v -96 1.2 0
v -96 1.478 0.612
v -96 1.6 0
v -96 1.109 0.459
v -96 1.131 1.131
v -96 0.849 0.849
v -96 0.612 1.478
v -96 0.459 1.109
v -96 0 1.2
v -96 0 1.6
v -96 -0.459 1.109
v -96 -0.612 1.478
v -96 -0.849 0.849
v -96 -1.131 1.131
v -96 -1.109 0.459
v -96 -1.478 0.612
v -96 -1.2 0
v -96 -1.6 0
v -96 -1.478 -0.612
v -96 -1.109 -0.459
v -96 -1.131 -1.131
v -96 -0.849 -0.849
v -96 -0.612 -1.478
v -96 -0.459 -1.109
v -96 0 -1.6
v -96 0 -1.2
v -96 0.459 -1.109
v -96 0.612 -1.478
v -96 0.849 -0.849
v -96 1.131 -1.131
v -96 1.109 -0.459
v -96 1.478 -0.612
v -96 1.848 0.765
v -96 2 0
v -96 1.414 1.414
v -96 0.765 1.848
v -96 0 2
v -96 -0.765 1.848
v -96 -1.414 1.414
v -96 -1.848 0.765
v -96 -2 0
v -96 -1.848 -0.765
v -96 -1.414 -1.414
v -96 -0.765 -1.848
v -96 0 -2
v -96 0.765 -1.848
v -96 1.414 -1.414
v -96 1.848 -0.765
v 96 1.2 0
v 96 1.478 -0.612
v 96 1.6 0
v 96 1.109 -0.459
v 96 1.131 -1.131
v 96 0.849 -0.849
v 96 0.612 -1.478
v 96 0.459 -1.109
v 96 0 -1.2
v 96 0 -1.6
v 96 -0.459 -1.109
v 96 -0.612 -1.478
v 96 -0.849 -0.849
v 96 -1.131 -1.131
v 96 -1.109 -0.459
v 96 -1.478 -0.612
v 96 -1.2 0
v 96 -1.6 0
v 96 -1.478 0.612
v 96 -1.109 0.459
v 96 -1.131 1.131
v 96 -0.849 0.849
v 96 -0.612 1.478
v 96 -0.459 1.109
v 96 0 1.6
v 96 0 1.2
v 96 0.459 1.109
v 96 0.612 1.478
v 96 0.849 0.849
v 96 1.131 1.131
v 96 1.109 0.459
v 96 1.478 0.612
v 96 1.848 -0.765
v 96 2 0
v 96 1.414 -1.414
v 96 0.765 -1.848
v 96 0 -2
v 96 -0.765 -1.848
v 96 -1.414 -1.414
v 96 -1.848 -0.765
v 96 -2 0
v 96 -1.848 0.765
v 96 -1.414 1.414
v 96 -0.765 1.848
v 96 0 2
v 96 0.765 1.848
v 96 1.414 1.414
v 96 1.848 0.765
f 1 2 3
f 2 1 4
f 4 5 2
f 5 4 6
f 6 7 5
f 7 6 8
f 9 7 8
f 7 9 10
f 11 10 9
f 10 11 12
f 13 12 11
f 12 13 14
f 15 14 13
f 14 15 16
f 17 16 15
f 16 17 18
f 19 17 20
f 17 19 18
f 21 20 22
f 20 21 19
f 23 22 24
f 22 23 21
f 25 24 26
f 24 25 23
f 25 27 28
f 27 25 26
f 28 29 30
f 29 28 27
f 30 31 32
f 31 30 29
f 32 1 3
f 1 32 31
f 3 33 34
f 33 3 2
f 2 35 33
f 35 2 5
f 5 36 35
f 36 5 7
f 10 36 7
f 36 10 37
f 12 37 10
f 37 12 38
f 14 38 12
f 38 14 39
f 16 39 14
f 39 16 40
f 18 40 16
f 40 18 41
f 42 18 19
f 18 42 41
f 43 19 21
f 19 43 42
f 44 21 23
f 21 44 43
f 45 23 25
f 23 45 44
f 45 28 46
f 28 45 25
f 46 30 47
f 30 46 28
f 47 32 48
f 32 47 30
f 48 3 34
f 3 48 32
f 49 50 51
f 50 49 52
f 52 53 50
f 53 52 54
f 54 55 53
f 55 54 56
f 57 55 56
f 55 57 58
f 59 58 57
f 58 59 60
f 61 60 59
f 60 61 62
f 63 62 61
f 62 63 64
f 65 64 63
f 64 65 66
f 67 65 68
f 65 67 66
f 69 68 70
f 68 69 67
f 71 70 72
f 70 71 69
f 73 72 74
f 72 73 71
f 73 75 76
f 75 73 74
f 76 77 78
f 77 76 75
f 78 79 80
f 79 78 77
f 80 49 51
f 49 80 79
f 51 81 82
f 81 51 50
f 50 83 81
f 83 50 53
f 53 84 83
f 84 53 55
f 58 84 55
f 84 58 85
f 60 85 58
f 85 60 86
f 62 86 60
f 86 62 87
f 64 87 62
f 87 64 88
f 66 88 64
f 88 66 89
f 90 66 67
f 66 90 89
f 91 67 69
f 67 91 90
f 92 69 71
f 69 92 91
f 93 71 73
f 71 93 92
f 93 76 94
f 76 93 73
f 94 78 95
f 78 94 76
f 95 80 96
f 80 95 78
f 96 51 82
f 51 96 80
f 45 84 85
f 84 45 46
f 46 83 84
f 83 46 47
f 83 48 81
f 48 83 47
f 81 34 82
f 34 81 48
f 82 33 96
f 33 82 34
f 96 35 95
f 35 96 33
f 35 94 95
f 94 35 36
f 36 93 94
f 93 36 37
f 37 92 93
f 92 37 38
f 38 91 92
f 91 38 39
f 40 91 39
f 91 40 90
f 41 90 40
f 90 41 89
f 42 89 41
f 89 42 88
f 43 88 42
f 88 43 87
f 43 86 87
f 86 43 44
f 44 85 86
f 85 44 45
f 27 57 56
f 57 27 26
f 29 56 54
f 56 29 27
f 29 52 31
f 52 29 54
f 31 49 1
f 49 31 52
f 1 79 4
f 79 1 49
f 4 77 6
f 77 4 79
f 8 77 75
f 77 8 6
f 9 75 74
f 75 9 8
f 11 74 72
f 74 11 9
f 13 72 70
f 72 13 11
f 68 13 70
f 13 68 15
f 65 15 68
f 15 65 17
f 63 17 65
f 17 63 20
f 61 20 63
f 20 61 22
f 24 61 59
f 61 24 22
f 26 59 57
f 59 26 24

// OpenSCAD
// file: ../p/4-4cyli.scad
use <../lib.scad>
function ldraw_lib__4_4cyli() = [
// 0 Cylinder 1.0
// 0 Name: 4-4cyli.dat
// 0 Author: James Jessiman
// 0 !LDRAW_ORG Primitive UPDATE 2005-01
// 0 !LICENSE Licensed under CC BY 4.0 : see CAreadme.txt
// 
// 0 BFC CERTIFY CCW
  [0,"BFC","CERTIFY"],
  [0,"BFC","CCW"],
// 
// 0 !HISTORY 1998-12-15 [PTadmin] Official Update 1998-10
// 0 !HISTORY 2002-03-23 [sbliss] Added BFC statement; merged headers from files in distributions LDraw 0.27 and Complete.
// 0 !HISTORY 2002-04-25 [PTadmin] Official Update 2002-02
// 0 !HISTORY 2004-12-14 [guyvivan] BFC CCW
// 0 !HISTORY 2005-12-28 [PTadmin] Official Update 2005-01
// 0 !HISTORY 2007-06-24 [PTadmin] Header formatted for Contributor Agreement
// 0 !HISTORY 2008-07-01 [PTadmin] Official Update 2008-01
// 
// 
// 4 16 1 1 0 0.9239 1 0.3827 0.9239 0 0.3827 1 0 0
  [4,16,1,1,0,0.9239,1,0.3827,0.9239,0,0.3827,1,0,0],
// 5 24 1 0 0 1 1 0 0.9239 0 0.3827 0.9239 0 -0.3827
  [5,24,1,0,0,1,1,0,0.9239,0,0.3827,0.9239,0,-0.3827],
// 4 16 0.9239 1 0.3827 0.7071 1 0.7071 0.7071 0 0.7071 0.9239 0 0.3827
  [4,16,0.9239,1,0.3827,0.7071,1,0.7071,0.7071,0,0.7071,0.9239,0,0.3827],
// 5 24 0.9239 0 0.3827 0.9239 1 0.3827 0.7071 0 0.7071 1 0 0
  [5,24,0.9239,0,0.3827,0.9239,1,0.3827,0.7071,0,0.7071,1,0,0],
// 4 16 0.7071 1 0.7071 0.3827 1 0.9239 0.3827 0 0.9239 0.7071 0 0.7071
  [4,16,0.7071,1,0.7071,0.3827,1,0.9239,0.3827,0,0.9239,0.7071,0,0.7071],
// 5 24 0.7071 0 0.7071 0.7071 1 0.7071 0.3827 0 0.9239 0.9239 0 0.3827
  [5,24,0.7071,0,0.7071,0.7071,1,0.7071,0.3827,0,0.9239,0.9239,0,0.3827],
// 4 16 0.3827 1 0.9239 0 1 1 0 0 1 0.3827 0 0.9239
  [4,16,0.3827,1,0.9239,0,1,1,0,0,1,0.3827,0,0.9239],
// 5 24 0.3827 0 0.9239 0.3827 1 0.9239 0 0 1 0.7071 0 0.7071
  [5,24,0.3827,0,0.9239,0.3827,1,0.9239,0,0,1,0.7071,0,0.7071],
// 4 16 0 1 1 -0.3827 1 0.9239 -0.3827 0 0.9239 0 0 1
  [4,16,0,1,1,-0.3827,1,0.9239,-0.3827,0,0.9239,0,0,1],
// 5 24 0 0 1 0 1 1 -0.3827 0 0.9239 0.3827 0 0.9239
  [5,24,0,0,1,0,1,1,-0.3827,0,0.9239,0.3827,0,0.9239],
// 4 16 -0.3827 1 0.9239 -0.7071 1 0.7071 -0.7071 0 0.7071 -0.3827 0 0.9239
  [4,16,-0.3827,1,0.9239,-0.7071,1,0.7071,-0.7071,0,0.7071,-0.3827,0,0.9239],
// 5 24 -0.3827 0 0.9239 -0.3827 1 0.9239 -0.7071 0 0.7071 0 0 1
  [5,24,-0.3827,0,0.9239,-0.3827,1,0.9239,-0.7071,0,0.7071,0,0,1],
// 4 16 -0.7071 1 0.7071 -0.9239 1 0.3827 -0.9239 0 0.3827 -0.7071 0 0.7071
  [4,16,-0.7071,1,0.7071,-0.9239,1,0.3827,-0.9239,0,0.3827,-0.7071,0,0.7071],
// 5 24 -0.7071 0 0.7071 -0.7071 1 0.7071 -0.9239 0 0.3827 -0.3827 0 0.9239
  [5,24,-0.7071,0,0.7071,-0.7071,1,0.7071,-0.9239,0,0.3827,-0.3827,0,0.9239],
// 4 16 -0.9239 1 0.3827 -1 1 0 -1 0 0 -0.9239 0 0.3827
  [4,16,-0.9239,1,0.3827,-1,1,0,-1,0,0,-0.9239,0,0.3827],
// 5 24 -0.9239 0 0.3827 -0.9239 1 0.3827 -1 0 0 -0.7071 0 0.7071
  [5,24,-0.9239,0,0.3827,-0.9239,1,0.3827,-1,0,0,-0.7071,0,0.7071],
// 4 16 -1 1 0 -0.9239 1 -0.3827 -0.9239 0 -0.3827 -1 0 0
  [4,16,-1,1,0,-0.9239,1,-0.3827,-0.9239,0,-0.3827,-1,0,0],
// 5 24 -1 0 0 -1 1 0 -0.9239 0 -0.3827 -0.9239 0 0.3827
  [5,24,-1,0,0,-1,1,0,-0.9239,0,-0.3827,-0.9239,0,0.3827],
// 4 16 -0.9239 1 -0.3827 -0.7071 1 -0.7071 -0.7071 0 -0.7071 -0.9239 0 -0.3827
  [4,16,-0.9239,1,-0.3827,-0.7071,1,-0.7071,-0.7071,0,-0.7071,-0.9239,0,-0.3827],
// 5 24 -0.9239 0 -0.3827 -0.9239 1 -0.3827 -0.7071 0 -0.7071 -1 0 0
  [5,24,-0.9239,0,-0.3827,-0.9239,1,-0.3827,-0.7071,0,-0.7071,-1,0,0],
// 4 16 -0.7071 1 -0.7071 -0.3827 1 -0.9239 -0.3827 0 -0.9239 -0.7071 0 -0.7071
  [4,16,-0.7071,1,-0.7071,-0.3827,1,-0.9239,-0.3827,0,-0.9239,-0.7071,0,-0.7071],
// 5 24 -0.7071 0 -0.7071 -0.7071 1 -0.7071 -0.3827 0 -0.9239 -0.9239 0 -0.3827
  [5,24,-0.7071,0,-0.7071,-0.7071,1,-0.7071,-0.3827,0,-0.9239,-0.9239,0,-0.3827],
// 4 16 -0.3827 1 -0.9239 0 1 -1 0 0 -1 -0.3827 0 -0.9239
  [4,16,-0.3827,1,-0.9239,0,1,-1,0,0,-1,-0.3827,0,-0.9239],
// 5 24 -0.3827 0 -0.9239 -0.3827 1 -0.9239 0 0 -1 -0.7071 0 -0.7071
  [5,24,-0.3827,0,-0.9239,-0.3827,1,-0.9239,0,0,-1,-0.7071,0,-0.7071],
// 4 16 0 1 -1 0.3827 1 -0.9239 0.3827 0 -0.9239 0 0 -1
  [4,16,0,1,-1,0.3827,1,-0.9239,0.3827,0,-0.9239,0,0,-1],
// 5 24 0 0 -1 0 1 -1 0.3827 0 -0.9239 -0.3827 0 -0.9239
  [5,24,0,0,-1,0,1,-1,0.3827,0,-0.9239,-0.3827,0,-0.9239],
// 4 16 0.3827 1 -0.9239 0.7071 1 -0.7071 0.7071 0 -0.7071 0.3827 0 -0.9239
  [4,16,0.3827,1,-0.9239,0.7071,1,-0.7071,0.7071,0,-0.7071,0.3827,0,-0.9239],
// 5 24 0.3827 0 -0.9239 0.3827 1 -0.9239 0.7071 0 -0.7071 0 0 -1
  [5,24,0.3827,0,-0.9239,0.3827,1,-0.9239,0.7071,0,-0.7071,0,0,-1],
// 4 16 0.7071 1 -0.7071 0.9239 1 -0.3827 0.9239 0 -0.3827 0.7071 0 -0.7071
  [4,16,0.7071,1,-0.7071,0.9239,1,-0.3827,0.9239,0,-0.3827,0.7071,0,-0.7071],
// 5 24 0.7071 0 -0.7071 0.7071 1 -0.7071 0.9239 0 -0.3827 0.3827 0 -0.9239
  [5,24,0.7071,0,-0.7071,0.7071,1,-0.7071,0.9239,0,-0.3827,0.3827,0,-0.9239],
// 4 16 0.9239 1 -0.3827 1 1 0 1 0 0 0.9239 0 -0.3827
  [4,16,0.9239,1,-0.3827,1,1,0,1,0,0,0.9239,0,-0.3827],
// 5 24 0.9239 0 -0.3827 0.9239 1 -0.3827 1 0 0 0.7071 0 -0.7071
  [5,24,0.9239,0,-0.3827,0.9239,1,-0.3827,1,0,0,0.7071,0,-0.7071],
// 0
];
module ldraw_lib__4_4cyli(step=0, col=false, unit=2/5, alt=false, line=0.2, solid=!$preview)
    makepoly(ldraw_lib__4_4cyli(), step=step, col=col, unit=unit, alt=alt, line=line, solid=solid);
ldraw_lib__4_4cyli(line=0.2);
// file: ../p/4-4ring4.scad
use <../lib.scad>
function ldraw_lib__4_4ring4() = [
// 0 Ring  4 x 1.0
// 0 Name: 4-4ring4.dat
// 0 Author: James Jessiman
// 0 !LDRAW_ORG Primitive UPDATE 2009-01
// 0 !LICENSE Licensed under CC BY 4.0 : see CAreadme.txt
// 
// 0 BFC CERTIFY CCW
  [0,"BFC","CERTIFY"],
  [0,"BFC","CCW"],
// 
// 0 !HISTORY 1998-12-15 [PTadmin] Official Update 1998-10
// 0 !HISTORY 2002-04-08 [BrickCaster] Modified for BFC compliance
// 0 !HISTORY 2002-04-25 [PTadmin] Official Update 2002-02
// 0 !HISTORY 2007-06-24 [PTadmin] Header formatted for Contributor Agreement
// 0 !HISTORY 2008-07-01 [PTadmin] Official Update 2008-01
// 0 !HISTORY 2008-08-26 [cwdee] Switch polygon winding and rename
// 0 !HISTORY 2009-05-02 [PTadmin] Official Update 2009-01
// 
// 
// 4 16 -1.9135 0 4.6195 -1.5308 0 3.6956 0 0 4 0 0 5
  [4,16,-1.9135,0,4.6195,-1.5308,0,3.6956,0,0,4,0,0,5],
// 4 16 -3.5355 0 3.5355 -2.8284 0 2.8284 -1.5308 0 3.6956 -1.9135 0 4.6195
  [4,16,-3.5355,0,3.5355,-2.8284,0,2.8284,-1.5308,0,3.6956,-1.9135,0,4.6195],
// 4 16 -4.6195 0 1.9135 -3.6956 0 1.5308 -2.8284 0 2.8284 -3.5355 0 3.5355
  [4,16,-4.6195,0,1.9135,-3.6956,0,1.5308,-2.8284,0,2.8284,-3.5355,0,3.5355],
// 4 16 -5 0 0 -4 0 0 -3.6956 0 1.5308 -4.6195 0 1.9135
  [4,16,-5,0,0,-4,0,0,-3.6956,0,1.5308,-4.6195,0,1.9135],
// 4 16 -4.6195 0 -1.9135 -3.6956 0 -1.5308 -4 0 0 -5 0 0
  [4,16,-4.6195,0,-1.9135,-3.6956,0,-1.5308,-4,0,0,-5,0,0],
// 4 16 -3.5355 0 -3.5355 -2.8284 0 -2.8284 -3.6956 0 -1.5308 -4.6195 0 -1.9135
  [4,16,-3.5355,0,-3.5355,-2.8284,0,-2.8284,-3.6956,0,-1.5308,-4.6195,0,-1.9135],
// 4 16 -1.9135 0 -4.6195 -1.5308 0 -3.6956 -2.8284 0 -2.8284 -3.5355 0 -3.5355
  [4,16,-1.9135,0,-4.6195,-1.5308,0,-3.6956,-2.8284,0,-2.8284,-3.5355,0,-3.5355],
// 4 16 0 0 -5 0 0 -4 -1.5308 0 -3.6956 -1.9135 0 -4.6195
  [4,16,0,0,-5,0,0,-4,-1.5308,0,-3.6956,-1.9135,0,-4.6195],
// 4 16 1.9135 0 -4.6195 1.5308 0 -3.6956 0 0 -4 0 0 -5
  [4,16,1.9135,0,-4.6195,1.5308,0,-3.6956,0,0,-4,0,0,-5],
// 4 16 3.5355 0 -3.5355 2.8284 0 -2.8284 1.5308 0 -3.6956 1.9135 0 -4.6195
  [4,16,3.5355,0,-3.5355,2.8284,0,-2.8284,1.5308,0,-3.6956,1.9135,0,-4.6195],
// 4 16 4.6195 0 -1.9135 3.6956 0 -1.5308 2.8284 0 -2.8284 3.5355 0 -3.5355
  [4,16,4.6195,0,-1.9135,3.6956,0,-1.5308,2.8284,0,-2.8284,3.5355,0,-3.5355],
// 4 16 5 0 0 4 0 0 3.6956 0 -1.5308 4.6195 0 -1.9135
  [4,16,5,0,0,4,0,0,3.6956,0,-1.5308,4.6195,0,-1.9135],
// 4 16 4.6195 0 1.9135 3.6956 0 1.5308 4 0 0 5 0 0
  [4,16,4.6195,0,1.9135,3.6956,0,1.5308,4,0,0,5,0,0],
// 4 16 3.5355 0 3.5355 2.8284 0 2.8284 3.6956 0 1.5308 4.6195 0 1.9135
  [4,16,3.5355,0,3.5355,2.8284,0,2.8284,3.6956,0,1.5308,4.6195,0,1.9135],
// 4 16 1.9135 0 4.6195 1.5308 0 3.6956 2.8284 0 2.8284 3.5355 0 3.5355
  [4,16,1.9135,0,4.6195,1.5308,0,3.6956,2.8284,0,2.8284,3.5355,0,3.5355],
// 4 16 0 0 5 0 0 4 1.5308 0 3.6956 1.9135 0 4.6195
  [4,16,0,0,5,0,0,4,1.5308,0,3.6956,1.9135,0,4.6195],
// 0
];
module ldraw_lib__4_4ring4(step=0, col=false, unit=2/5, alt=false, line=0.2, solid=!$preview)
    makepoly(ldraw_lib__4_4ring4(), step=step, col=col, unit=unit, alt=alt, line=line, solid=solid);
ldraw_lib__4_4ring4(line=0.2);
// file: ../p/4-4ring3.scad
use <../lib.scad>
function ldraw_lib__4_4ring3() = [
// 0 Ring  3 x 1.0
// 0 Name: 4-4ring3.dat
// 0 Author: James Jessiman
// 0 !LDRAW_ORG Primitive UPDATE 2009-01
// 0 !LICENSE Licensed under CC BY 4.0 : see CAreadme.txt
// 
// 0 BFC CERTIFY CCW
  [0,"BFC","CERTIFY"],
  [0,"BFC","CCW"],
// 
// 0 !HISTORY 1998-12-15 [PTadmin] Official Update 1998-10
// 0 !HISTORY 2002-04-05 [hafhead] Added BFC statement
// 0 !HISTORY 2002-04-25 [PTadmin] Official Update 2002-02
// 0 !HISTORY 2007-06-24 [PTadmin] Header formatted for Contributor Agreement
// 0 !HISTORY 2008-07-01 [PTadmin] Official Update 2008-01
// 0 !HISTORY 2008-08-26 [cwdee] Switch polygon winding and rename
// 0 !HISTORY 2009-05-02 [PTadmin] Official Update 2009-01
// 
// 
// 4 16 -1.5308 0 3.6956 -1.1481 0 2.7717 0 0 3 0 0 4
  [4,16,-1.5308,0,3.6956,-1.1481,0,2.7717,0,0,3,0,0,4],
// 4 16 -2.8284 0 2.8284 -2.1213 0 2.1213 -1.1481 0 2.7717 -1.5308 0 3.6956
  [4,16,-2.8284,0,2.8284,-2.1213,0,2.1213,-1.1481,0,2.7717,-1.5308,0,3.6956],
// 4 16 -3.6956 0 1.5308 -2.7717 0 1.1481 -2.1213 0 2.1213 -2.8284 0 2.8284
  [4,16,-3.6956,0,1.5308,-2.7717,0,1.1481,-2.1213,0,2.1213,-2.8284,0,2.8284],
// 4 16 -4 0 0 -3 0 0 -2.7717 0 1.1481 -3.6956 0 1.5308
  [4,16,-4,0,0,-3,0,0,-2.7717,0,1.1481,-3.6956,0,1.5308],
// 4 16 -3.6956 0 -1.5308 -2.7717 0 -1.1481 -3 0 0 -4 0 0
  [4,16,-3.6956,0,-1.5308,-2.7717,0,-1.1481,-3,0,0,-4,0,0],
// 4 16 -2.8284 0 -2.8284 -2.1213 0 -2.1213 -2.7717 0 -1.1481 -3.6956 0 -1.5308
  [4,16,-2.8284,0,-2.8284,-2.1213,0,-2.1213,-2.7717,0,-1.1481,-3.6956,0,-1.5308],
// 4 16 -1.5308 0 -3.6956 -1.1481 0 -2.7717 -2.1213 0 -2.1213 -2.8284 0 -2.8284
  [4,16,-1.5308,0,-3.6956,-1.1481,0,-2.7717,-2.1213,0,-2.1213,-2.8284,0,-2.8284],
// 4 16 0 0 -4 0 0 -3 -1.1481 0 -2.7717 -1.5308 0 -3.6956
  [4,16,0,0,-4,0,0,-3,-1.1481,0,-2.7717,-1.5308,0,-3.6956],
// 4 16 1.5308 0 -3.6956 1.1481 0 -2.7717 0 0 -3 0 0 -4
  [4,16,1.5308,0,-3.6956,1.1481,0,-2.7717,0,0,-3,0,0,-4],
// 4 16 2.8284 0 -2.8284 2.1213 0 -2.1213 1.1481 0 -2.7717 1.5308 0 -3.6956
  [4,16,2.8284,0,-2.8284,2.1213,0,-2.1213,1.1481,0,-2.7717,1.5308,0,-3.6956],
// 4 16 3.6956 0 -1.5308 2.7717 0 -1.1481 2.1213 0 -2.1213 2.8284 0 -2.8284
  [4,16,3.6956,0,-1.5308,2.7717,0,-1.1481,2.1213,0,-2.1213,2.8284,0,-2.8284],
// 4 16 4 0 0 3 0 0 2.7717 0 -1.1481 3.6956 0 -1.5308
  [4,16,4,0,0,3,0,0,2.7717,0,-1.1481,3.6956,0,-1.5308],
// 4 16 3.6956 0 1.5308 2.7717 0 1.1481 3 0 0 4 0 0
  [4,16,3.6956,0,1.5308,2.7717,0,1.1481,3,0,0,4,0,0],
// 4 16 2.8284 0 2.8284 2.1213 0 2.1213 2.7717 0 1.1481 3.6956 0 1.5308
  [4,16,2.8284,0,2.8284,2.1213,0,2.1213,2.7717,0,1.1481,3.6956,0,1.5308],
// 4 16 1.5308 0 3.6956 1.1481 0 2.7717 2.1213 0 2.1213 2.8284 0 2.8284
  [4,16,1.5308,0,3.6956,1.1481,0,2.7717,2.1213,0,2.1213,2.8284,0,2.8284],
// 4 16 0 0 4 0 0 3 1.1481 0 2.7717 1.5308 0 3.6956
  [4,16,0,0,4,0,0,3,1.1481,0,2.7717,1.5308,0,3.6956],
// 0
];
module ldraw_lib__4_4ring3(step=0, col=false, unit=2/5, alt=false, line=0.2, solid=!$preview)
    makepoly(ldraw_lib__4_4ring3(), step=step, col=col, unit=unit, alt=alt, line=line, solid=solid);
ldraw_lib__4_4ring3(line=0.2);
// file: ../p/4-4edge.scad
use <../lib.scad>
function ldraw_lib__4_4edge() = [
// 0 Circle 1.0
// 0 Name: 4-4edge.dat
// 0 Author: James Jessiman
// 0 !LDRAW_ORG Primitive UPDATE 2017-01
// 0 !LICENSE Licensed under CC BY 4.0 : see CAreadme.txt
// 
// 0 BFC CERTIFY CCW
  [0,"BFC","CERTIFY"],
  [0,"BFC","CCW"],
// 
// 0 !HISTORY 1998-12-15 [PTadmin] Official Update 1998-10
// 0 !HISTORY 2005-12-28 [PTadmin] Official Update 2005-01
// 0 !HISTORY 2007-06-24 [PTadmin] Header formatted for Contributor Agreement
// 0 !HISTORY 2008-07-01 [PTadmin] Official Update 2008-01
// 0 !HISTORY 2017-01-15 [Steffen] BFCed
// 0 !HISTORY 2017-12-30 [PTadmin] Official Update 2017-01
// 
// 
// 2 24 1 0 0 0.9239 0 0.3827
  [2,24,1,0,0,0.9239,0,0.3827],
// 2 24 0.9239 0 0.3827 0.7071 0 0.7071
  [2,24,0.9239,0,0.3827,0.7071,0,0.7071],
// 2 24 0.7071 0 0.7071 0.3827 0 0.9239
  [2,24,0.7071,0,0.7071,0.3827,0,0.9239],
// 2 24 0.3827 0 0.9239 0 0 1
  [2,24,0.3827,0,0.9239,0,0,1],
// 2 24 0 0 1 -0.3827 0 0.9239
  [2,24,0,0,1,-0.3827,0,0.9239],
// 2 24 -0.3827 0 0.9239 -0.7071 0 0.7071
  [2,24,-0.3827,0,0.9239,-0.7071,0,0.7071],
// 2 24 -0.7071 0 0.7071 -0.9239 0 0.3827
  [2,24,-0.7071,0,0.7071,-0.9239,0,0.3827],
// 2 24 -0.9239 0 0.3827 -1 0 -0
  [2,24,-0.9239,0,0.3827,-1,0,-0],
// 2 24 -1 0 -0 -0.9239 0 -0.3827
  [2,24,-1,0,-0,-0.9239,0,-0.3827],
// 2 24 -0.9239 0 -0.3827 -0.7071 0 -0.7071
  [2,24,-0.9239,0,-0.3827,-0.7071,0,-0.7071],
// 2 24 -0.7071 0 -0.7071 -0.3827 0 -0.9239
  [2,24,-0.7071,0,-0.7071,-0.3827,0,-0.9239],
// 2 24 -0.3827 0 -0.9239 0 0 -1
  [2,24,-0.3827,0,-0.9239,0,0,-1],
// 2 24 0 0 -1 0.3827 0 -0.9239
  [2,24,0,0,-1,0.3827,0,-0.9239],
// 2 24 0.3827 0 -0.9239 0.7071 0 -0.7071
  [2,24,0.3827,0,-0.9239,0.7071,0,-0.7071],
// 2 24 0.7071 0 -0.7071 0.9239 0 -0.3827
  [2,24,0.7071,0,-0.7071,0.9239,0,-0.3827],
// 2 24 0.9239 0 -0.3827 1 0 0
  [2,24,0.9239,0,-0.3827,1,0,0],
];
module ldraw_lib__4_4edge(step=0, col=false, unit=2/5, alt=false, line=0.2, solid=!$preview)
    makepoly(ldraw_lib__4_4edge(), step=step, col=col, unit=unit, alt=alt, line=line, solid=solid);
ldraw_lib__4_4edge(line=0.2);
// file: 71533k03.scad
use <../lib.scad>
use <../p/4-4cyli.scad>
function ldraw_lib__71533k03() = [
// 0 ~Technic Pneumatic Tube Segment
// 0 Name: 71533k03.dat
// 0 Author: Jaco van der Molen [Jaco]
// 0 !LDRAW_ORG Part Flexible_Section UPDATE 2020-01
// 0 !LICENSE Licensed under CC BY 4.0 : see CAreadme.txt
// 
// 0 BFC CERTIFY CW
  [0,"BFC","CERTIFY"],
  [0,"BFC","CW"],
// 
// 0 !HISTORY 2003-11-30 [Steffen] BFCed
// 0 !HISTORY 2009-12-29 [PTadmin] Official Update 2009-03
// 0 !HISTORY 2020-06-27 [PTadmin] Renamed from 166
// 0 !HISTORY 2020-06-28 [PTadmin] Official Update 2020-01
// 
// 
// 1 16 0 0 0 5 0 0 0 1 0 0 0 5 4-4cyli.dat
  [1,16,0,0,0,5,0,0,0,1,0,0,0,5, ldraw_lib__4_4cyli()],
// 0 BFC INVERTNEXT
  [0,"BFC","INVERTNEXT"],
// 1 16 0 0 0 3 0 0 0 1 0 0 0 3 4-4cyli.dat
  [1,16,0,0,0,3,0,0,0,1,0,0,0,3, ldraw_lib__4_4cyli()],
// 0
];
module ldraw_lib__71533k03(step=0, col=false, unit=2/5, alt=false, line=0.2, solid=!$preview)
    makepoly(ldraw_lib__71533k03(), step=step, col=col, unit=unit, alt=alt, line=line, solid=solid);
ldraw_lib__71533k03(line=0.2);
// file: 71533k02.scad
use <../lib.scad>
use <../p/4-4edge.scad>
use <../p/4-4ring3.scad>
use <../p/4-4ring4.scad>
function ldraw_lib__71533k02() = [
// 0 ~Technic Pneumatic Tube End (Non-Bulged)
// 0 Name: 71533k02.dat
// 0 Author: Steffen [Steffen]
// 0 !LDRAW_ORG Part Flexible_Section UPDATE 2020-01
// 0 !LICENSE Licensed under CC BY 4.0 : see CAreadme.txt
// 
// 0 BFC CERTIFY CCW
  [0,"BFC","CERTIFY"],
  [0,"BFC","CCW"],
// 
// 0 !HISTORY 2020-06-28 [PTadmin] Official Update 2020-01
// 
// 
// 0 // This file goes together with 71533k01.dat and 71533k03.dat.
// 0 // Those 3 files can be used to create Technic Pneumatic Tubes
// 0 // with either bulged or non-bulged ends.
// 
// 1 16 0 0 0 1 0 0 0 1 0 0 0 1 4-4ring3.dat
  [1,16,0,0,0,1,0,0,0,1,0,0,0,1, ldraw_lib__4_4ring3()],
// 1 16 0 0 0 1 0 0 0 1 0 0 0 1 4-4ring4.dat
  [1,16,0,0,0,1,0,0,0,1,0,0,0,1, ldraw_lib__4_4ring4()],
// 1 16 0 0 0 3 0 0 0 3 0 0 0 3 4-4edge.dat
  [1,16,0,0,0,3,0,0,0,3,0,0,0,3, ldraw_lib__4_4edge()],
// 1 16 0 0 0 5 0 0 0 5 0 0 0 5 4-4edge.dat
  [1,16,0,0,0,5,0,0,0,5,0,0,0,5, ldraw_lib__4_4edge()],
];
module ldraw_lib__71533k02(step=0, col=false, unit=2/5, alt=false, line=0.2, solid=!$preview)
    makepoly(ldraw_lib__71533k02(), step=step, col=col, unit=unit, alt=alt, line=line, solid=solid);
ldraw_lib__71533k02(line=0.2);
// main file
use <../lib.scad>
use <71533k02.scad>
use <71533k03.scad>
function ldraw_lib__63540_f1() = [
// 0 Technic Pneumatic Tube 24L
// 0 Name: 63540-f1.dat
// 0 Author: Philippe Hurbain [Philo]
// 0 !LDRAW_ORG Part UPDATE 2025-05
// 0 !LICENSE Licensed under CC BY 4.0 : see CAreadme.txt
// 
// 0 BFC CERTIFY CCW
  [0,"BFC","CERTIFY"],
  [0,"BFC","CCW"],
// 
// 0 !KEYWORDS 192 mm, BrickLink 5102c24, Rebrickable 5102c24
// 
// 0 !HISTORY 2025-05-28 [OrionP] Official Update 2025-05
// 
// 1 16 -240 0 0 0 1 0 1 0 0 0 0 1 71533k02.dat
  [1,16,-240,0,0,0,1,0,1,0,0,0,0,1, ldraw_lib__71533k02()],
// 1 16 240 0 0 0 -1 0 -1 0 0 0 0 1 71533k02.dat
  [1,16,240,0,0,0,-1,0,-1,0,0,0,0,1, ldraw_lib__71533k02()],
// 1 16 -240 0 0 0 480 0 1 0 0 0 0 1 71533k03.dat
  [1,16,-240,0,0,0,480,0,1,0,0,0,0,1, ldraw_lib__71533k03()],
];
module ldraw_lib__63540_f1(step=0, col=false, unit=2/5, alt=false, line=0.2, solid=!$preview)
    makepoly(ldraw_lib__63540_f1(), step=step, col=col, unit=unit, alt=alt, line=line, solid=solid);
ldraw_lib__63540_f1(line=0.2);
